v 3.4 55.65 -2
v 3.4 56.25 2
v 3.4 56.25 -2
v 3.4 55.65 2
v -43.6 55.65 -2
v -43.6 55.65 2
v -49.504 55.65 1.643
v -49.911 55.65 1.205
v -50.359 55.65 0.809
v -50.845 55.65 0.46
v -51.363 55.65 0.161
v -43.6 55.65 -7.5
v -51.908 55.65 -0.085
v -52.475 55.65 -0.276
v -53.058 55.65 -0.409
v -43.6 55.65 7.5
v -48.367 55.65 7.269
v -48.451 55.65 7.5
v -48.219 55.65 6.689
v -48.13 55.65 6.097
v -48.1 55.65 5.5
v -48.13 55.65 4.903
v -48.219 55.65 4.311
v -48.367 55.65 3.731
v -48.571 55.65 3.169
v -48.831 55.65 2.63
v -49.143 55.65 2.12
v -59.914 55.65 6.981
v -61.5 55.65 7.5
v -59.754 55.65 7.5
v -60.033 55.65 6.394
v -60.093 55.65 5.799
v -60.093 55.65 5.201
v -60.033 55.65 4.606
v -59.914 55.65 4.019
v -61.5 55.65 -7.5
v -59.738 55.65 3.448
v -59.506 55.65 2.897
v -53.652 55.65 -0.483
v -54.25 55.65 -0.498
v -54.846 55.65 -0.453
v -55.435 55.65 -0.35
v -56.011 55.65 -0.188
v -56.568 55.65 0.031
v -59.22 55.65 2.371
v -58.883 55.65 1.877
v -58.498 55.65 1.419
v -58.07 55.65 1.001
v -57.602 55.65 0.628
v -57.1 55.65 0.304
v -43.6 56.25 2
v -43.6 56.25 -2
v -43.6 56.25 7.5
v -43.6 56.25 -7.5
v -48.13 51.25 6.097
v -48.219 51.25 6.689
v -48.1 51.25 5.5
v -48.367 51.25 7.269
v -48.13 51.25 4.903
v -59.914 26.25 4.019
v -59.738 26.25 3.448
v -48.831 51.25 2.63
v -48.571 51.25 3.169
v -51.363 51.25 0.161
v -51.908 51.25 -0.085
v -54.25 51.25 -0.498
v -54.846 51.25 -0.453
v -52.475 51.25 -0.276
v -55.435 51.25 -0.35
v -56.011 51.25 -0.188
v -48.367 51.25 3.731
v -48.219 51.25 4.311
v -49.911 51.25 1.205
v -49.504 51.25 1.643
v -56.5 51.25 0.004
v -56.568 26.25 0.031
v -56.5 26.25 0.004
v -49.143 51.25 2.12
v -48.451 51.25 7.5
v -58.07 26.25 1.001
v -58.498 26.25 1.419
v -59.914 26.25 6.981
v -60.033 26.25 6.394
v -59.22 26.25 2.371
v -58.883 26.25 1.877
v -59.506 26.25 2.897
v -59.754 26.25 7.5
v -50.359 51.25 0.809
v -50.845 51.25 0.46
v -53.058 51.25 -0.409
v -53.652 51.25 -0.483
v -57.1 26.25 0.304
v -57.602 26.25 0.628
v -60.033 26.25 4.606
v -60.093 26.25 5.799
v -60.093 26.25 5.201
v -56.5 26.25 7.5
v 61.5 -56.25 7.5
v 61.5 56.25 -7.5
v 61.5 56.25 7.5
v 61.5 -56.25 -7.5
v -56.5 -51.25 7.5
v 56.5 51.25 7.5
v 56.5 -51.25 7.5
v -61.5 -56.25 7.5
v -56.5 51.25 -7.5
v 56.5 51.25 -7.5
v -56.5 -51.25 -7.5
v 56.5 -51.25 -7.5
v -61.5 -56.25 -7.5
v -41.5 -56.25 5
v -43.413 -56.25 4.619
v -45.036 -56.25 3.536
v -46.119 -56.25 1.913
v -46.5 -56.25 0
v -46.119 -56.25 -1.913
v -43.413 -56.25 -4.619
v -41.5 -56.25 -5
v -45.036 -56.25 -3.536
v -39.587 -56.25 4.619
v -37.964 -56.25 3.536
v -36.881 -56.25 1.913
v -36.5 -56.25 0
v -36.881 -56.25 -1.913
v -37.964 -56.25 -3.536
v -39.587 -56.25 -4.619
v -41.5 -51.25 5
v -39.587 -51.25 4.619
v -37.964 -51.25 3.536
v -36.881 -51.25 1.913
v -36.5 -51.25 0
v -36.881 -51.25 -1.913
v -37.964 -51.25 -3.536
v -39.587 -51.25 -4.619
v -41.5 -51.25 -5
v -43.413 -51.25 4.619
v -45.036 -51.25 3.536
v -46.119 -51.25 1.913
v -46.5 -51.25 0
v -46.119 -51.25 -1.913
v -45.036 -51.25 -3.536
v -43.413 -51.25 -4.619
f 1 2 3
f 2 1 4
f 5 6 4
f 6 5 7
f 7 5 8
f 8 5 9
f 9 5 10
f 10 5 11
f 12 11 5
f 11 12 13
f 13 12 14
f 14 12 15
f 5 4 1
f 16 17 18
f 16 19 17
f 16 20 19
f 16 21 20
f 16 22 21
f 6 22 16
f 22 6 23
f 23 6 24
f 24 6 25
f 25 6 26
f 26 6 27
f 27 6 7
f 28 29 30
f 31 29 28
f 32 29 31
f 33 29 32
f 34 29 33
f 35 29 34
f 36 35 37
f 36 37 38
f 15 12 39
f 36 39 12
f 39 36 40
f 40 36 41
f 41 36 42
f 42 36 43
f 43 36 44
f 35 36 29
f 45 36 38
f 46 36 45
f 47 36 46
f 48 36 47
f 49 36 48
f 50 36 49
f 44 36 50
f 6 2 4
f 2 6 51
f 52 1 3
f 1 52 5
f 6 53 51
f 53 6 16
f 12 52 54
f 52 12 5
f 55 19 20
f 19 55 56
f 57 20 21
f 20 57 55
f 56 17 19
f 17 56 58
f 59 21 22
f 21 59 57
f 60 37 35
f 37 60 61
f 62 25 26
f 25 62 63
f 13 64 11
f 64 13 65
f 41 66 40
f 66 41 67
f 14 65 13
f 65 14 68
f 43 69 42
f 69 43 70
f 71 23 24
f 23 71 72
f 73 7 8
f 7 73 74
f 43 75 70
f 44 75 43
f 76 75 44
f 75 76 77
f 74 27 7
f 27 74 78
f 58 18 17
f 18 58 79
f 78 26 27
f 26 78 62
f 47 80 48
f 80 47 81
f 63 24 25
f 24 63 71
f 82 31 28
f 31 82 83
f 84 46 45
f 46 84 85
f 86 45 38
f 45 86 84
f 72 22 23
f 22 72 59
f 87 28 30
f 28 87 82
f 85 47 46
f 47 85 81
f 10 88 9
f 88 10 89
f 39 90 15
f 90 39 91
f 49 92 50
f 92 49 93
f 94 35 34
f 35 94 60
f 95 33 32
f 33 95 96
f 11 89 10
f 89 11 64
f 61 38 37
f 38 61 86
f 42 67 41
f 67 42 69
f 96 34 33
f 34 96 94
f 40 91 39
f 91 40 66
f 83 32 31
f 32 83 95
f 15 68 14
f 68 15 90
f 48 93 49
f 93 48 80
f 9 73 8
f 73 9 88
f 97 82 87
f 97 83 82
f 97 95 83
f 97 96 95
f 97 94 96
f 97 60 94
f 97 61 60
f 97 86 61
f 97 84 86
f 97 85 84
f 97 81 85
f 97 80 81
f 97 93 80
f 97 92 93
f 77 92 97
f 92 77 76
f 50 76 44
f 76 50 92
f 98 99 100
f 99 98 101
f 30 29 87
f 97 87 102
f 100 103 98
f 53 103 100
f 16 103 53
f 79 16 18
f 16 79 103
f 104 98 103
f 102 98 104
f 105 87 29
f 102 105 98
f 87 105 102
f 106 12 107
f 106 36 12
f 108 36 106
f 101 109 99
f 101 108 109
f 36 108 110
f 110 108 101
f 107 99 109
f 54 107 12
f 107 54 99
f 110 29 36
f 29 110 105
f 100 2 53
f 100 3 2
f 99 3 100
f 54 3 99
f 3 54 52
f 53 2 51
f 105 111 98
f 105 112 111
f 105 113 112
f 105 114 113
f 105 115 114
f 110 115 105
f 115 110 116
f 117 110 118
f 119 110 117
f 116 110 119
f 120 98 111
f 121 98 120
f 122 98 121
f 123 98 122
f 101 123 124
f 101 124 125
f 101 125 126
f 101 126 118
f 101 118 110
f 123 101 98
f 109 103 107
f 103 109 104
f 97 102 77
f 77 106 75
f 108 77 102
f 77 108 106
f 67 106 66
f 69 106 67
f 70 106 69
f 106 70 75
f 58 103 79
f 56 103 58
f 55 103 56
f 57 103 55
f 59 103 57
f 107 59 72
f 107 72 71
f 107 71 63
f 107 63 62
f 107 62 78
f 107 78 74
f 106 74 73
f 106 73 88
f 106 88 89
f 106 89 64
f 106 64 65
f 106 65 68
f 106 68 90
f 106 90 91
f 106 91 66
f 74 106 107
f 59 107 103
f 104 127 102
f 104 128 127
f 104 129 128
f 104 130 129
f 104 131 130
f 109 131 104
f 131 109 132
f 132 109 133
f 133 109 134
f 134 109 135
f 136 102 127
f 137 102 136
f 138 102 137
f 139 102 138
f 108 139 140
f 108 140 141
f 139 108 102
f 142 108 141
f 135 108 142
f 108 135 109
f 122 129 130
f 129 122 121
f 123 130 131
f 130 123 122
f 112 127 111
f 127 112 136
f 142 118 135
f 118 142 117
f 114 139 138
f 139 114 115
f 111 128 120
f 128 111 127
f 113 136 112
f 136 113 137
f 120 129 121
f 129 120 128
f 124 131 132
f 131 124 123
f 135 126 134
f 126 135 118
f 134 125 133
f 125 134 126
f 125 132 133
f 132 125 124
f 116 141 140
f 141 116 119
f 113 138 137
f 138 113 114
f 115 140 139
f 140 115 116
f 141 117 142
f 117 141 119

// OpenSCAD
module sma() {
    cylinder(d=8, h=10, $fn=61);
}

antenna_len = 47.0;

module lna() {
    rotate([90,0,0]) union() {
        color("blue") cube([antenna_len+18,4,1.6]);
        color("blue") translate([0,-12.5,0]) cube([18,25,1.6]);
        color("gold") translate([7.5,7.5,1]) sma();
    }
}

module cable_space() {
    rotate([90,0,0]) union() {
        cube([antenna_len+18,4,1.6]);
        translate([0,-12.5,0]) cube([18,25,1.6]);
        translate([7.5,7.5,1]) cylinder(d=12,h=30, $fn=63);
    }
}


diameter=123.0;
height = 112.5;
frame_depth = 5;
frame_thickness = 15;

module frame() {
    //translate([-diameter/2, height/2+1.6,-2]) lna();
    difference() {
        cube([diameter, height, frame_thickness], center=true);
        cube([diameter-frame_depth*2, height-frame_depth*2, 20], center=true);
        translate([-diameter/2-0.1, height/2+1.0,-2]) cable_space();
        translate([-diameter/2 + 20, -height/2+1.6,0]) rotate([90,0,0]) cylinder(d=10, h=20, center=true);
    }
}

frame();
